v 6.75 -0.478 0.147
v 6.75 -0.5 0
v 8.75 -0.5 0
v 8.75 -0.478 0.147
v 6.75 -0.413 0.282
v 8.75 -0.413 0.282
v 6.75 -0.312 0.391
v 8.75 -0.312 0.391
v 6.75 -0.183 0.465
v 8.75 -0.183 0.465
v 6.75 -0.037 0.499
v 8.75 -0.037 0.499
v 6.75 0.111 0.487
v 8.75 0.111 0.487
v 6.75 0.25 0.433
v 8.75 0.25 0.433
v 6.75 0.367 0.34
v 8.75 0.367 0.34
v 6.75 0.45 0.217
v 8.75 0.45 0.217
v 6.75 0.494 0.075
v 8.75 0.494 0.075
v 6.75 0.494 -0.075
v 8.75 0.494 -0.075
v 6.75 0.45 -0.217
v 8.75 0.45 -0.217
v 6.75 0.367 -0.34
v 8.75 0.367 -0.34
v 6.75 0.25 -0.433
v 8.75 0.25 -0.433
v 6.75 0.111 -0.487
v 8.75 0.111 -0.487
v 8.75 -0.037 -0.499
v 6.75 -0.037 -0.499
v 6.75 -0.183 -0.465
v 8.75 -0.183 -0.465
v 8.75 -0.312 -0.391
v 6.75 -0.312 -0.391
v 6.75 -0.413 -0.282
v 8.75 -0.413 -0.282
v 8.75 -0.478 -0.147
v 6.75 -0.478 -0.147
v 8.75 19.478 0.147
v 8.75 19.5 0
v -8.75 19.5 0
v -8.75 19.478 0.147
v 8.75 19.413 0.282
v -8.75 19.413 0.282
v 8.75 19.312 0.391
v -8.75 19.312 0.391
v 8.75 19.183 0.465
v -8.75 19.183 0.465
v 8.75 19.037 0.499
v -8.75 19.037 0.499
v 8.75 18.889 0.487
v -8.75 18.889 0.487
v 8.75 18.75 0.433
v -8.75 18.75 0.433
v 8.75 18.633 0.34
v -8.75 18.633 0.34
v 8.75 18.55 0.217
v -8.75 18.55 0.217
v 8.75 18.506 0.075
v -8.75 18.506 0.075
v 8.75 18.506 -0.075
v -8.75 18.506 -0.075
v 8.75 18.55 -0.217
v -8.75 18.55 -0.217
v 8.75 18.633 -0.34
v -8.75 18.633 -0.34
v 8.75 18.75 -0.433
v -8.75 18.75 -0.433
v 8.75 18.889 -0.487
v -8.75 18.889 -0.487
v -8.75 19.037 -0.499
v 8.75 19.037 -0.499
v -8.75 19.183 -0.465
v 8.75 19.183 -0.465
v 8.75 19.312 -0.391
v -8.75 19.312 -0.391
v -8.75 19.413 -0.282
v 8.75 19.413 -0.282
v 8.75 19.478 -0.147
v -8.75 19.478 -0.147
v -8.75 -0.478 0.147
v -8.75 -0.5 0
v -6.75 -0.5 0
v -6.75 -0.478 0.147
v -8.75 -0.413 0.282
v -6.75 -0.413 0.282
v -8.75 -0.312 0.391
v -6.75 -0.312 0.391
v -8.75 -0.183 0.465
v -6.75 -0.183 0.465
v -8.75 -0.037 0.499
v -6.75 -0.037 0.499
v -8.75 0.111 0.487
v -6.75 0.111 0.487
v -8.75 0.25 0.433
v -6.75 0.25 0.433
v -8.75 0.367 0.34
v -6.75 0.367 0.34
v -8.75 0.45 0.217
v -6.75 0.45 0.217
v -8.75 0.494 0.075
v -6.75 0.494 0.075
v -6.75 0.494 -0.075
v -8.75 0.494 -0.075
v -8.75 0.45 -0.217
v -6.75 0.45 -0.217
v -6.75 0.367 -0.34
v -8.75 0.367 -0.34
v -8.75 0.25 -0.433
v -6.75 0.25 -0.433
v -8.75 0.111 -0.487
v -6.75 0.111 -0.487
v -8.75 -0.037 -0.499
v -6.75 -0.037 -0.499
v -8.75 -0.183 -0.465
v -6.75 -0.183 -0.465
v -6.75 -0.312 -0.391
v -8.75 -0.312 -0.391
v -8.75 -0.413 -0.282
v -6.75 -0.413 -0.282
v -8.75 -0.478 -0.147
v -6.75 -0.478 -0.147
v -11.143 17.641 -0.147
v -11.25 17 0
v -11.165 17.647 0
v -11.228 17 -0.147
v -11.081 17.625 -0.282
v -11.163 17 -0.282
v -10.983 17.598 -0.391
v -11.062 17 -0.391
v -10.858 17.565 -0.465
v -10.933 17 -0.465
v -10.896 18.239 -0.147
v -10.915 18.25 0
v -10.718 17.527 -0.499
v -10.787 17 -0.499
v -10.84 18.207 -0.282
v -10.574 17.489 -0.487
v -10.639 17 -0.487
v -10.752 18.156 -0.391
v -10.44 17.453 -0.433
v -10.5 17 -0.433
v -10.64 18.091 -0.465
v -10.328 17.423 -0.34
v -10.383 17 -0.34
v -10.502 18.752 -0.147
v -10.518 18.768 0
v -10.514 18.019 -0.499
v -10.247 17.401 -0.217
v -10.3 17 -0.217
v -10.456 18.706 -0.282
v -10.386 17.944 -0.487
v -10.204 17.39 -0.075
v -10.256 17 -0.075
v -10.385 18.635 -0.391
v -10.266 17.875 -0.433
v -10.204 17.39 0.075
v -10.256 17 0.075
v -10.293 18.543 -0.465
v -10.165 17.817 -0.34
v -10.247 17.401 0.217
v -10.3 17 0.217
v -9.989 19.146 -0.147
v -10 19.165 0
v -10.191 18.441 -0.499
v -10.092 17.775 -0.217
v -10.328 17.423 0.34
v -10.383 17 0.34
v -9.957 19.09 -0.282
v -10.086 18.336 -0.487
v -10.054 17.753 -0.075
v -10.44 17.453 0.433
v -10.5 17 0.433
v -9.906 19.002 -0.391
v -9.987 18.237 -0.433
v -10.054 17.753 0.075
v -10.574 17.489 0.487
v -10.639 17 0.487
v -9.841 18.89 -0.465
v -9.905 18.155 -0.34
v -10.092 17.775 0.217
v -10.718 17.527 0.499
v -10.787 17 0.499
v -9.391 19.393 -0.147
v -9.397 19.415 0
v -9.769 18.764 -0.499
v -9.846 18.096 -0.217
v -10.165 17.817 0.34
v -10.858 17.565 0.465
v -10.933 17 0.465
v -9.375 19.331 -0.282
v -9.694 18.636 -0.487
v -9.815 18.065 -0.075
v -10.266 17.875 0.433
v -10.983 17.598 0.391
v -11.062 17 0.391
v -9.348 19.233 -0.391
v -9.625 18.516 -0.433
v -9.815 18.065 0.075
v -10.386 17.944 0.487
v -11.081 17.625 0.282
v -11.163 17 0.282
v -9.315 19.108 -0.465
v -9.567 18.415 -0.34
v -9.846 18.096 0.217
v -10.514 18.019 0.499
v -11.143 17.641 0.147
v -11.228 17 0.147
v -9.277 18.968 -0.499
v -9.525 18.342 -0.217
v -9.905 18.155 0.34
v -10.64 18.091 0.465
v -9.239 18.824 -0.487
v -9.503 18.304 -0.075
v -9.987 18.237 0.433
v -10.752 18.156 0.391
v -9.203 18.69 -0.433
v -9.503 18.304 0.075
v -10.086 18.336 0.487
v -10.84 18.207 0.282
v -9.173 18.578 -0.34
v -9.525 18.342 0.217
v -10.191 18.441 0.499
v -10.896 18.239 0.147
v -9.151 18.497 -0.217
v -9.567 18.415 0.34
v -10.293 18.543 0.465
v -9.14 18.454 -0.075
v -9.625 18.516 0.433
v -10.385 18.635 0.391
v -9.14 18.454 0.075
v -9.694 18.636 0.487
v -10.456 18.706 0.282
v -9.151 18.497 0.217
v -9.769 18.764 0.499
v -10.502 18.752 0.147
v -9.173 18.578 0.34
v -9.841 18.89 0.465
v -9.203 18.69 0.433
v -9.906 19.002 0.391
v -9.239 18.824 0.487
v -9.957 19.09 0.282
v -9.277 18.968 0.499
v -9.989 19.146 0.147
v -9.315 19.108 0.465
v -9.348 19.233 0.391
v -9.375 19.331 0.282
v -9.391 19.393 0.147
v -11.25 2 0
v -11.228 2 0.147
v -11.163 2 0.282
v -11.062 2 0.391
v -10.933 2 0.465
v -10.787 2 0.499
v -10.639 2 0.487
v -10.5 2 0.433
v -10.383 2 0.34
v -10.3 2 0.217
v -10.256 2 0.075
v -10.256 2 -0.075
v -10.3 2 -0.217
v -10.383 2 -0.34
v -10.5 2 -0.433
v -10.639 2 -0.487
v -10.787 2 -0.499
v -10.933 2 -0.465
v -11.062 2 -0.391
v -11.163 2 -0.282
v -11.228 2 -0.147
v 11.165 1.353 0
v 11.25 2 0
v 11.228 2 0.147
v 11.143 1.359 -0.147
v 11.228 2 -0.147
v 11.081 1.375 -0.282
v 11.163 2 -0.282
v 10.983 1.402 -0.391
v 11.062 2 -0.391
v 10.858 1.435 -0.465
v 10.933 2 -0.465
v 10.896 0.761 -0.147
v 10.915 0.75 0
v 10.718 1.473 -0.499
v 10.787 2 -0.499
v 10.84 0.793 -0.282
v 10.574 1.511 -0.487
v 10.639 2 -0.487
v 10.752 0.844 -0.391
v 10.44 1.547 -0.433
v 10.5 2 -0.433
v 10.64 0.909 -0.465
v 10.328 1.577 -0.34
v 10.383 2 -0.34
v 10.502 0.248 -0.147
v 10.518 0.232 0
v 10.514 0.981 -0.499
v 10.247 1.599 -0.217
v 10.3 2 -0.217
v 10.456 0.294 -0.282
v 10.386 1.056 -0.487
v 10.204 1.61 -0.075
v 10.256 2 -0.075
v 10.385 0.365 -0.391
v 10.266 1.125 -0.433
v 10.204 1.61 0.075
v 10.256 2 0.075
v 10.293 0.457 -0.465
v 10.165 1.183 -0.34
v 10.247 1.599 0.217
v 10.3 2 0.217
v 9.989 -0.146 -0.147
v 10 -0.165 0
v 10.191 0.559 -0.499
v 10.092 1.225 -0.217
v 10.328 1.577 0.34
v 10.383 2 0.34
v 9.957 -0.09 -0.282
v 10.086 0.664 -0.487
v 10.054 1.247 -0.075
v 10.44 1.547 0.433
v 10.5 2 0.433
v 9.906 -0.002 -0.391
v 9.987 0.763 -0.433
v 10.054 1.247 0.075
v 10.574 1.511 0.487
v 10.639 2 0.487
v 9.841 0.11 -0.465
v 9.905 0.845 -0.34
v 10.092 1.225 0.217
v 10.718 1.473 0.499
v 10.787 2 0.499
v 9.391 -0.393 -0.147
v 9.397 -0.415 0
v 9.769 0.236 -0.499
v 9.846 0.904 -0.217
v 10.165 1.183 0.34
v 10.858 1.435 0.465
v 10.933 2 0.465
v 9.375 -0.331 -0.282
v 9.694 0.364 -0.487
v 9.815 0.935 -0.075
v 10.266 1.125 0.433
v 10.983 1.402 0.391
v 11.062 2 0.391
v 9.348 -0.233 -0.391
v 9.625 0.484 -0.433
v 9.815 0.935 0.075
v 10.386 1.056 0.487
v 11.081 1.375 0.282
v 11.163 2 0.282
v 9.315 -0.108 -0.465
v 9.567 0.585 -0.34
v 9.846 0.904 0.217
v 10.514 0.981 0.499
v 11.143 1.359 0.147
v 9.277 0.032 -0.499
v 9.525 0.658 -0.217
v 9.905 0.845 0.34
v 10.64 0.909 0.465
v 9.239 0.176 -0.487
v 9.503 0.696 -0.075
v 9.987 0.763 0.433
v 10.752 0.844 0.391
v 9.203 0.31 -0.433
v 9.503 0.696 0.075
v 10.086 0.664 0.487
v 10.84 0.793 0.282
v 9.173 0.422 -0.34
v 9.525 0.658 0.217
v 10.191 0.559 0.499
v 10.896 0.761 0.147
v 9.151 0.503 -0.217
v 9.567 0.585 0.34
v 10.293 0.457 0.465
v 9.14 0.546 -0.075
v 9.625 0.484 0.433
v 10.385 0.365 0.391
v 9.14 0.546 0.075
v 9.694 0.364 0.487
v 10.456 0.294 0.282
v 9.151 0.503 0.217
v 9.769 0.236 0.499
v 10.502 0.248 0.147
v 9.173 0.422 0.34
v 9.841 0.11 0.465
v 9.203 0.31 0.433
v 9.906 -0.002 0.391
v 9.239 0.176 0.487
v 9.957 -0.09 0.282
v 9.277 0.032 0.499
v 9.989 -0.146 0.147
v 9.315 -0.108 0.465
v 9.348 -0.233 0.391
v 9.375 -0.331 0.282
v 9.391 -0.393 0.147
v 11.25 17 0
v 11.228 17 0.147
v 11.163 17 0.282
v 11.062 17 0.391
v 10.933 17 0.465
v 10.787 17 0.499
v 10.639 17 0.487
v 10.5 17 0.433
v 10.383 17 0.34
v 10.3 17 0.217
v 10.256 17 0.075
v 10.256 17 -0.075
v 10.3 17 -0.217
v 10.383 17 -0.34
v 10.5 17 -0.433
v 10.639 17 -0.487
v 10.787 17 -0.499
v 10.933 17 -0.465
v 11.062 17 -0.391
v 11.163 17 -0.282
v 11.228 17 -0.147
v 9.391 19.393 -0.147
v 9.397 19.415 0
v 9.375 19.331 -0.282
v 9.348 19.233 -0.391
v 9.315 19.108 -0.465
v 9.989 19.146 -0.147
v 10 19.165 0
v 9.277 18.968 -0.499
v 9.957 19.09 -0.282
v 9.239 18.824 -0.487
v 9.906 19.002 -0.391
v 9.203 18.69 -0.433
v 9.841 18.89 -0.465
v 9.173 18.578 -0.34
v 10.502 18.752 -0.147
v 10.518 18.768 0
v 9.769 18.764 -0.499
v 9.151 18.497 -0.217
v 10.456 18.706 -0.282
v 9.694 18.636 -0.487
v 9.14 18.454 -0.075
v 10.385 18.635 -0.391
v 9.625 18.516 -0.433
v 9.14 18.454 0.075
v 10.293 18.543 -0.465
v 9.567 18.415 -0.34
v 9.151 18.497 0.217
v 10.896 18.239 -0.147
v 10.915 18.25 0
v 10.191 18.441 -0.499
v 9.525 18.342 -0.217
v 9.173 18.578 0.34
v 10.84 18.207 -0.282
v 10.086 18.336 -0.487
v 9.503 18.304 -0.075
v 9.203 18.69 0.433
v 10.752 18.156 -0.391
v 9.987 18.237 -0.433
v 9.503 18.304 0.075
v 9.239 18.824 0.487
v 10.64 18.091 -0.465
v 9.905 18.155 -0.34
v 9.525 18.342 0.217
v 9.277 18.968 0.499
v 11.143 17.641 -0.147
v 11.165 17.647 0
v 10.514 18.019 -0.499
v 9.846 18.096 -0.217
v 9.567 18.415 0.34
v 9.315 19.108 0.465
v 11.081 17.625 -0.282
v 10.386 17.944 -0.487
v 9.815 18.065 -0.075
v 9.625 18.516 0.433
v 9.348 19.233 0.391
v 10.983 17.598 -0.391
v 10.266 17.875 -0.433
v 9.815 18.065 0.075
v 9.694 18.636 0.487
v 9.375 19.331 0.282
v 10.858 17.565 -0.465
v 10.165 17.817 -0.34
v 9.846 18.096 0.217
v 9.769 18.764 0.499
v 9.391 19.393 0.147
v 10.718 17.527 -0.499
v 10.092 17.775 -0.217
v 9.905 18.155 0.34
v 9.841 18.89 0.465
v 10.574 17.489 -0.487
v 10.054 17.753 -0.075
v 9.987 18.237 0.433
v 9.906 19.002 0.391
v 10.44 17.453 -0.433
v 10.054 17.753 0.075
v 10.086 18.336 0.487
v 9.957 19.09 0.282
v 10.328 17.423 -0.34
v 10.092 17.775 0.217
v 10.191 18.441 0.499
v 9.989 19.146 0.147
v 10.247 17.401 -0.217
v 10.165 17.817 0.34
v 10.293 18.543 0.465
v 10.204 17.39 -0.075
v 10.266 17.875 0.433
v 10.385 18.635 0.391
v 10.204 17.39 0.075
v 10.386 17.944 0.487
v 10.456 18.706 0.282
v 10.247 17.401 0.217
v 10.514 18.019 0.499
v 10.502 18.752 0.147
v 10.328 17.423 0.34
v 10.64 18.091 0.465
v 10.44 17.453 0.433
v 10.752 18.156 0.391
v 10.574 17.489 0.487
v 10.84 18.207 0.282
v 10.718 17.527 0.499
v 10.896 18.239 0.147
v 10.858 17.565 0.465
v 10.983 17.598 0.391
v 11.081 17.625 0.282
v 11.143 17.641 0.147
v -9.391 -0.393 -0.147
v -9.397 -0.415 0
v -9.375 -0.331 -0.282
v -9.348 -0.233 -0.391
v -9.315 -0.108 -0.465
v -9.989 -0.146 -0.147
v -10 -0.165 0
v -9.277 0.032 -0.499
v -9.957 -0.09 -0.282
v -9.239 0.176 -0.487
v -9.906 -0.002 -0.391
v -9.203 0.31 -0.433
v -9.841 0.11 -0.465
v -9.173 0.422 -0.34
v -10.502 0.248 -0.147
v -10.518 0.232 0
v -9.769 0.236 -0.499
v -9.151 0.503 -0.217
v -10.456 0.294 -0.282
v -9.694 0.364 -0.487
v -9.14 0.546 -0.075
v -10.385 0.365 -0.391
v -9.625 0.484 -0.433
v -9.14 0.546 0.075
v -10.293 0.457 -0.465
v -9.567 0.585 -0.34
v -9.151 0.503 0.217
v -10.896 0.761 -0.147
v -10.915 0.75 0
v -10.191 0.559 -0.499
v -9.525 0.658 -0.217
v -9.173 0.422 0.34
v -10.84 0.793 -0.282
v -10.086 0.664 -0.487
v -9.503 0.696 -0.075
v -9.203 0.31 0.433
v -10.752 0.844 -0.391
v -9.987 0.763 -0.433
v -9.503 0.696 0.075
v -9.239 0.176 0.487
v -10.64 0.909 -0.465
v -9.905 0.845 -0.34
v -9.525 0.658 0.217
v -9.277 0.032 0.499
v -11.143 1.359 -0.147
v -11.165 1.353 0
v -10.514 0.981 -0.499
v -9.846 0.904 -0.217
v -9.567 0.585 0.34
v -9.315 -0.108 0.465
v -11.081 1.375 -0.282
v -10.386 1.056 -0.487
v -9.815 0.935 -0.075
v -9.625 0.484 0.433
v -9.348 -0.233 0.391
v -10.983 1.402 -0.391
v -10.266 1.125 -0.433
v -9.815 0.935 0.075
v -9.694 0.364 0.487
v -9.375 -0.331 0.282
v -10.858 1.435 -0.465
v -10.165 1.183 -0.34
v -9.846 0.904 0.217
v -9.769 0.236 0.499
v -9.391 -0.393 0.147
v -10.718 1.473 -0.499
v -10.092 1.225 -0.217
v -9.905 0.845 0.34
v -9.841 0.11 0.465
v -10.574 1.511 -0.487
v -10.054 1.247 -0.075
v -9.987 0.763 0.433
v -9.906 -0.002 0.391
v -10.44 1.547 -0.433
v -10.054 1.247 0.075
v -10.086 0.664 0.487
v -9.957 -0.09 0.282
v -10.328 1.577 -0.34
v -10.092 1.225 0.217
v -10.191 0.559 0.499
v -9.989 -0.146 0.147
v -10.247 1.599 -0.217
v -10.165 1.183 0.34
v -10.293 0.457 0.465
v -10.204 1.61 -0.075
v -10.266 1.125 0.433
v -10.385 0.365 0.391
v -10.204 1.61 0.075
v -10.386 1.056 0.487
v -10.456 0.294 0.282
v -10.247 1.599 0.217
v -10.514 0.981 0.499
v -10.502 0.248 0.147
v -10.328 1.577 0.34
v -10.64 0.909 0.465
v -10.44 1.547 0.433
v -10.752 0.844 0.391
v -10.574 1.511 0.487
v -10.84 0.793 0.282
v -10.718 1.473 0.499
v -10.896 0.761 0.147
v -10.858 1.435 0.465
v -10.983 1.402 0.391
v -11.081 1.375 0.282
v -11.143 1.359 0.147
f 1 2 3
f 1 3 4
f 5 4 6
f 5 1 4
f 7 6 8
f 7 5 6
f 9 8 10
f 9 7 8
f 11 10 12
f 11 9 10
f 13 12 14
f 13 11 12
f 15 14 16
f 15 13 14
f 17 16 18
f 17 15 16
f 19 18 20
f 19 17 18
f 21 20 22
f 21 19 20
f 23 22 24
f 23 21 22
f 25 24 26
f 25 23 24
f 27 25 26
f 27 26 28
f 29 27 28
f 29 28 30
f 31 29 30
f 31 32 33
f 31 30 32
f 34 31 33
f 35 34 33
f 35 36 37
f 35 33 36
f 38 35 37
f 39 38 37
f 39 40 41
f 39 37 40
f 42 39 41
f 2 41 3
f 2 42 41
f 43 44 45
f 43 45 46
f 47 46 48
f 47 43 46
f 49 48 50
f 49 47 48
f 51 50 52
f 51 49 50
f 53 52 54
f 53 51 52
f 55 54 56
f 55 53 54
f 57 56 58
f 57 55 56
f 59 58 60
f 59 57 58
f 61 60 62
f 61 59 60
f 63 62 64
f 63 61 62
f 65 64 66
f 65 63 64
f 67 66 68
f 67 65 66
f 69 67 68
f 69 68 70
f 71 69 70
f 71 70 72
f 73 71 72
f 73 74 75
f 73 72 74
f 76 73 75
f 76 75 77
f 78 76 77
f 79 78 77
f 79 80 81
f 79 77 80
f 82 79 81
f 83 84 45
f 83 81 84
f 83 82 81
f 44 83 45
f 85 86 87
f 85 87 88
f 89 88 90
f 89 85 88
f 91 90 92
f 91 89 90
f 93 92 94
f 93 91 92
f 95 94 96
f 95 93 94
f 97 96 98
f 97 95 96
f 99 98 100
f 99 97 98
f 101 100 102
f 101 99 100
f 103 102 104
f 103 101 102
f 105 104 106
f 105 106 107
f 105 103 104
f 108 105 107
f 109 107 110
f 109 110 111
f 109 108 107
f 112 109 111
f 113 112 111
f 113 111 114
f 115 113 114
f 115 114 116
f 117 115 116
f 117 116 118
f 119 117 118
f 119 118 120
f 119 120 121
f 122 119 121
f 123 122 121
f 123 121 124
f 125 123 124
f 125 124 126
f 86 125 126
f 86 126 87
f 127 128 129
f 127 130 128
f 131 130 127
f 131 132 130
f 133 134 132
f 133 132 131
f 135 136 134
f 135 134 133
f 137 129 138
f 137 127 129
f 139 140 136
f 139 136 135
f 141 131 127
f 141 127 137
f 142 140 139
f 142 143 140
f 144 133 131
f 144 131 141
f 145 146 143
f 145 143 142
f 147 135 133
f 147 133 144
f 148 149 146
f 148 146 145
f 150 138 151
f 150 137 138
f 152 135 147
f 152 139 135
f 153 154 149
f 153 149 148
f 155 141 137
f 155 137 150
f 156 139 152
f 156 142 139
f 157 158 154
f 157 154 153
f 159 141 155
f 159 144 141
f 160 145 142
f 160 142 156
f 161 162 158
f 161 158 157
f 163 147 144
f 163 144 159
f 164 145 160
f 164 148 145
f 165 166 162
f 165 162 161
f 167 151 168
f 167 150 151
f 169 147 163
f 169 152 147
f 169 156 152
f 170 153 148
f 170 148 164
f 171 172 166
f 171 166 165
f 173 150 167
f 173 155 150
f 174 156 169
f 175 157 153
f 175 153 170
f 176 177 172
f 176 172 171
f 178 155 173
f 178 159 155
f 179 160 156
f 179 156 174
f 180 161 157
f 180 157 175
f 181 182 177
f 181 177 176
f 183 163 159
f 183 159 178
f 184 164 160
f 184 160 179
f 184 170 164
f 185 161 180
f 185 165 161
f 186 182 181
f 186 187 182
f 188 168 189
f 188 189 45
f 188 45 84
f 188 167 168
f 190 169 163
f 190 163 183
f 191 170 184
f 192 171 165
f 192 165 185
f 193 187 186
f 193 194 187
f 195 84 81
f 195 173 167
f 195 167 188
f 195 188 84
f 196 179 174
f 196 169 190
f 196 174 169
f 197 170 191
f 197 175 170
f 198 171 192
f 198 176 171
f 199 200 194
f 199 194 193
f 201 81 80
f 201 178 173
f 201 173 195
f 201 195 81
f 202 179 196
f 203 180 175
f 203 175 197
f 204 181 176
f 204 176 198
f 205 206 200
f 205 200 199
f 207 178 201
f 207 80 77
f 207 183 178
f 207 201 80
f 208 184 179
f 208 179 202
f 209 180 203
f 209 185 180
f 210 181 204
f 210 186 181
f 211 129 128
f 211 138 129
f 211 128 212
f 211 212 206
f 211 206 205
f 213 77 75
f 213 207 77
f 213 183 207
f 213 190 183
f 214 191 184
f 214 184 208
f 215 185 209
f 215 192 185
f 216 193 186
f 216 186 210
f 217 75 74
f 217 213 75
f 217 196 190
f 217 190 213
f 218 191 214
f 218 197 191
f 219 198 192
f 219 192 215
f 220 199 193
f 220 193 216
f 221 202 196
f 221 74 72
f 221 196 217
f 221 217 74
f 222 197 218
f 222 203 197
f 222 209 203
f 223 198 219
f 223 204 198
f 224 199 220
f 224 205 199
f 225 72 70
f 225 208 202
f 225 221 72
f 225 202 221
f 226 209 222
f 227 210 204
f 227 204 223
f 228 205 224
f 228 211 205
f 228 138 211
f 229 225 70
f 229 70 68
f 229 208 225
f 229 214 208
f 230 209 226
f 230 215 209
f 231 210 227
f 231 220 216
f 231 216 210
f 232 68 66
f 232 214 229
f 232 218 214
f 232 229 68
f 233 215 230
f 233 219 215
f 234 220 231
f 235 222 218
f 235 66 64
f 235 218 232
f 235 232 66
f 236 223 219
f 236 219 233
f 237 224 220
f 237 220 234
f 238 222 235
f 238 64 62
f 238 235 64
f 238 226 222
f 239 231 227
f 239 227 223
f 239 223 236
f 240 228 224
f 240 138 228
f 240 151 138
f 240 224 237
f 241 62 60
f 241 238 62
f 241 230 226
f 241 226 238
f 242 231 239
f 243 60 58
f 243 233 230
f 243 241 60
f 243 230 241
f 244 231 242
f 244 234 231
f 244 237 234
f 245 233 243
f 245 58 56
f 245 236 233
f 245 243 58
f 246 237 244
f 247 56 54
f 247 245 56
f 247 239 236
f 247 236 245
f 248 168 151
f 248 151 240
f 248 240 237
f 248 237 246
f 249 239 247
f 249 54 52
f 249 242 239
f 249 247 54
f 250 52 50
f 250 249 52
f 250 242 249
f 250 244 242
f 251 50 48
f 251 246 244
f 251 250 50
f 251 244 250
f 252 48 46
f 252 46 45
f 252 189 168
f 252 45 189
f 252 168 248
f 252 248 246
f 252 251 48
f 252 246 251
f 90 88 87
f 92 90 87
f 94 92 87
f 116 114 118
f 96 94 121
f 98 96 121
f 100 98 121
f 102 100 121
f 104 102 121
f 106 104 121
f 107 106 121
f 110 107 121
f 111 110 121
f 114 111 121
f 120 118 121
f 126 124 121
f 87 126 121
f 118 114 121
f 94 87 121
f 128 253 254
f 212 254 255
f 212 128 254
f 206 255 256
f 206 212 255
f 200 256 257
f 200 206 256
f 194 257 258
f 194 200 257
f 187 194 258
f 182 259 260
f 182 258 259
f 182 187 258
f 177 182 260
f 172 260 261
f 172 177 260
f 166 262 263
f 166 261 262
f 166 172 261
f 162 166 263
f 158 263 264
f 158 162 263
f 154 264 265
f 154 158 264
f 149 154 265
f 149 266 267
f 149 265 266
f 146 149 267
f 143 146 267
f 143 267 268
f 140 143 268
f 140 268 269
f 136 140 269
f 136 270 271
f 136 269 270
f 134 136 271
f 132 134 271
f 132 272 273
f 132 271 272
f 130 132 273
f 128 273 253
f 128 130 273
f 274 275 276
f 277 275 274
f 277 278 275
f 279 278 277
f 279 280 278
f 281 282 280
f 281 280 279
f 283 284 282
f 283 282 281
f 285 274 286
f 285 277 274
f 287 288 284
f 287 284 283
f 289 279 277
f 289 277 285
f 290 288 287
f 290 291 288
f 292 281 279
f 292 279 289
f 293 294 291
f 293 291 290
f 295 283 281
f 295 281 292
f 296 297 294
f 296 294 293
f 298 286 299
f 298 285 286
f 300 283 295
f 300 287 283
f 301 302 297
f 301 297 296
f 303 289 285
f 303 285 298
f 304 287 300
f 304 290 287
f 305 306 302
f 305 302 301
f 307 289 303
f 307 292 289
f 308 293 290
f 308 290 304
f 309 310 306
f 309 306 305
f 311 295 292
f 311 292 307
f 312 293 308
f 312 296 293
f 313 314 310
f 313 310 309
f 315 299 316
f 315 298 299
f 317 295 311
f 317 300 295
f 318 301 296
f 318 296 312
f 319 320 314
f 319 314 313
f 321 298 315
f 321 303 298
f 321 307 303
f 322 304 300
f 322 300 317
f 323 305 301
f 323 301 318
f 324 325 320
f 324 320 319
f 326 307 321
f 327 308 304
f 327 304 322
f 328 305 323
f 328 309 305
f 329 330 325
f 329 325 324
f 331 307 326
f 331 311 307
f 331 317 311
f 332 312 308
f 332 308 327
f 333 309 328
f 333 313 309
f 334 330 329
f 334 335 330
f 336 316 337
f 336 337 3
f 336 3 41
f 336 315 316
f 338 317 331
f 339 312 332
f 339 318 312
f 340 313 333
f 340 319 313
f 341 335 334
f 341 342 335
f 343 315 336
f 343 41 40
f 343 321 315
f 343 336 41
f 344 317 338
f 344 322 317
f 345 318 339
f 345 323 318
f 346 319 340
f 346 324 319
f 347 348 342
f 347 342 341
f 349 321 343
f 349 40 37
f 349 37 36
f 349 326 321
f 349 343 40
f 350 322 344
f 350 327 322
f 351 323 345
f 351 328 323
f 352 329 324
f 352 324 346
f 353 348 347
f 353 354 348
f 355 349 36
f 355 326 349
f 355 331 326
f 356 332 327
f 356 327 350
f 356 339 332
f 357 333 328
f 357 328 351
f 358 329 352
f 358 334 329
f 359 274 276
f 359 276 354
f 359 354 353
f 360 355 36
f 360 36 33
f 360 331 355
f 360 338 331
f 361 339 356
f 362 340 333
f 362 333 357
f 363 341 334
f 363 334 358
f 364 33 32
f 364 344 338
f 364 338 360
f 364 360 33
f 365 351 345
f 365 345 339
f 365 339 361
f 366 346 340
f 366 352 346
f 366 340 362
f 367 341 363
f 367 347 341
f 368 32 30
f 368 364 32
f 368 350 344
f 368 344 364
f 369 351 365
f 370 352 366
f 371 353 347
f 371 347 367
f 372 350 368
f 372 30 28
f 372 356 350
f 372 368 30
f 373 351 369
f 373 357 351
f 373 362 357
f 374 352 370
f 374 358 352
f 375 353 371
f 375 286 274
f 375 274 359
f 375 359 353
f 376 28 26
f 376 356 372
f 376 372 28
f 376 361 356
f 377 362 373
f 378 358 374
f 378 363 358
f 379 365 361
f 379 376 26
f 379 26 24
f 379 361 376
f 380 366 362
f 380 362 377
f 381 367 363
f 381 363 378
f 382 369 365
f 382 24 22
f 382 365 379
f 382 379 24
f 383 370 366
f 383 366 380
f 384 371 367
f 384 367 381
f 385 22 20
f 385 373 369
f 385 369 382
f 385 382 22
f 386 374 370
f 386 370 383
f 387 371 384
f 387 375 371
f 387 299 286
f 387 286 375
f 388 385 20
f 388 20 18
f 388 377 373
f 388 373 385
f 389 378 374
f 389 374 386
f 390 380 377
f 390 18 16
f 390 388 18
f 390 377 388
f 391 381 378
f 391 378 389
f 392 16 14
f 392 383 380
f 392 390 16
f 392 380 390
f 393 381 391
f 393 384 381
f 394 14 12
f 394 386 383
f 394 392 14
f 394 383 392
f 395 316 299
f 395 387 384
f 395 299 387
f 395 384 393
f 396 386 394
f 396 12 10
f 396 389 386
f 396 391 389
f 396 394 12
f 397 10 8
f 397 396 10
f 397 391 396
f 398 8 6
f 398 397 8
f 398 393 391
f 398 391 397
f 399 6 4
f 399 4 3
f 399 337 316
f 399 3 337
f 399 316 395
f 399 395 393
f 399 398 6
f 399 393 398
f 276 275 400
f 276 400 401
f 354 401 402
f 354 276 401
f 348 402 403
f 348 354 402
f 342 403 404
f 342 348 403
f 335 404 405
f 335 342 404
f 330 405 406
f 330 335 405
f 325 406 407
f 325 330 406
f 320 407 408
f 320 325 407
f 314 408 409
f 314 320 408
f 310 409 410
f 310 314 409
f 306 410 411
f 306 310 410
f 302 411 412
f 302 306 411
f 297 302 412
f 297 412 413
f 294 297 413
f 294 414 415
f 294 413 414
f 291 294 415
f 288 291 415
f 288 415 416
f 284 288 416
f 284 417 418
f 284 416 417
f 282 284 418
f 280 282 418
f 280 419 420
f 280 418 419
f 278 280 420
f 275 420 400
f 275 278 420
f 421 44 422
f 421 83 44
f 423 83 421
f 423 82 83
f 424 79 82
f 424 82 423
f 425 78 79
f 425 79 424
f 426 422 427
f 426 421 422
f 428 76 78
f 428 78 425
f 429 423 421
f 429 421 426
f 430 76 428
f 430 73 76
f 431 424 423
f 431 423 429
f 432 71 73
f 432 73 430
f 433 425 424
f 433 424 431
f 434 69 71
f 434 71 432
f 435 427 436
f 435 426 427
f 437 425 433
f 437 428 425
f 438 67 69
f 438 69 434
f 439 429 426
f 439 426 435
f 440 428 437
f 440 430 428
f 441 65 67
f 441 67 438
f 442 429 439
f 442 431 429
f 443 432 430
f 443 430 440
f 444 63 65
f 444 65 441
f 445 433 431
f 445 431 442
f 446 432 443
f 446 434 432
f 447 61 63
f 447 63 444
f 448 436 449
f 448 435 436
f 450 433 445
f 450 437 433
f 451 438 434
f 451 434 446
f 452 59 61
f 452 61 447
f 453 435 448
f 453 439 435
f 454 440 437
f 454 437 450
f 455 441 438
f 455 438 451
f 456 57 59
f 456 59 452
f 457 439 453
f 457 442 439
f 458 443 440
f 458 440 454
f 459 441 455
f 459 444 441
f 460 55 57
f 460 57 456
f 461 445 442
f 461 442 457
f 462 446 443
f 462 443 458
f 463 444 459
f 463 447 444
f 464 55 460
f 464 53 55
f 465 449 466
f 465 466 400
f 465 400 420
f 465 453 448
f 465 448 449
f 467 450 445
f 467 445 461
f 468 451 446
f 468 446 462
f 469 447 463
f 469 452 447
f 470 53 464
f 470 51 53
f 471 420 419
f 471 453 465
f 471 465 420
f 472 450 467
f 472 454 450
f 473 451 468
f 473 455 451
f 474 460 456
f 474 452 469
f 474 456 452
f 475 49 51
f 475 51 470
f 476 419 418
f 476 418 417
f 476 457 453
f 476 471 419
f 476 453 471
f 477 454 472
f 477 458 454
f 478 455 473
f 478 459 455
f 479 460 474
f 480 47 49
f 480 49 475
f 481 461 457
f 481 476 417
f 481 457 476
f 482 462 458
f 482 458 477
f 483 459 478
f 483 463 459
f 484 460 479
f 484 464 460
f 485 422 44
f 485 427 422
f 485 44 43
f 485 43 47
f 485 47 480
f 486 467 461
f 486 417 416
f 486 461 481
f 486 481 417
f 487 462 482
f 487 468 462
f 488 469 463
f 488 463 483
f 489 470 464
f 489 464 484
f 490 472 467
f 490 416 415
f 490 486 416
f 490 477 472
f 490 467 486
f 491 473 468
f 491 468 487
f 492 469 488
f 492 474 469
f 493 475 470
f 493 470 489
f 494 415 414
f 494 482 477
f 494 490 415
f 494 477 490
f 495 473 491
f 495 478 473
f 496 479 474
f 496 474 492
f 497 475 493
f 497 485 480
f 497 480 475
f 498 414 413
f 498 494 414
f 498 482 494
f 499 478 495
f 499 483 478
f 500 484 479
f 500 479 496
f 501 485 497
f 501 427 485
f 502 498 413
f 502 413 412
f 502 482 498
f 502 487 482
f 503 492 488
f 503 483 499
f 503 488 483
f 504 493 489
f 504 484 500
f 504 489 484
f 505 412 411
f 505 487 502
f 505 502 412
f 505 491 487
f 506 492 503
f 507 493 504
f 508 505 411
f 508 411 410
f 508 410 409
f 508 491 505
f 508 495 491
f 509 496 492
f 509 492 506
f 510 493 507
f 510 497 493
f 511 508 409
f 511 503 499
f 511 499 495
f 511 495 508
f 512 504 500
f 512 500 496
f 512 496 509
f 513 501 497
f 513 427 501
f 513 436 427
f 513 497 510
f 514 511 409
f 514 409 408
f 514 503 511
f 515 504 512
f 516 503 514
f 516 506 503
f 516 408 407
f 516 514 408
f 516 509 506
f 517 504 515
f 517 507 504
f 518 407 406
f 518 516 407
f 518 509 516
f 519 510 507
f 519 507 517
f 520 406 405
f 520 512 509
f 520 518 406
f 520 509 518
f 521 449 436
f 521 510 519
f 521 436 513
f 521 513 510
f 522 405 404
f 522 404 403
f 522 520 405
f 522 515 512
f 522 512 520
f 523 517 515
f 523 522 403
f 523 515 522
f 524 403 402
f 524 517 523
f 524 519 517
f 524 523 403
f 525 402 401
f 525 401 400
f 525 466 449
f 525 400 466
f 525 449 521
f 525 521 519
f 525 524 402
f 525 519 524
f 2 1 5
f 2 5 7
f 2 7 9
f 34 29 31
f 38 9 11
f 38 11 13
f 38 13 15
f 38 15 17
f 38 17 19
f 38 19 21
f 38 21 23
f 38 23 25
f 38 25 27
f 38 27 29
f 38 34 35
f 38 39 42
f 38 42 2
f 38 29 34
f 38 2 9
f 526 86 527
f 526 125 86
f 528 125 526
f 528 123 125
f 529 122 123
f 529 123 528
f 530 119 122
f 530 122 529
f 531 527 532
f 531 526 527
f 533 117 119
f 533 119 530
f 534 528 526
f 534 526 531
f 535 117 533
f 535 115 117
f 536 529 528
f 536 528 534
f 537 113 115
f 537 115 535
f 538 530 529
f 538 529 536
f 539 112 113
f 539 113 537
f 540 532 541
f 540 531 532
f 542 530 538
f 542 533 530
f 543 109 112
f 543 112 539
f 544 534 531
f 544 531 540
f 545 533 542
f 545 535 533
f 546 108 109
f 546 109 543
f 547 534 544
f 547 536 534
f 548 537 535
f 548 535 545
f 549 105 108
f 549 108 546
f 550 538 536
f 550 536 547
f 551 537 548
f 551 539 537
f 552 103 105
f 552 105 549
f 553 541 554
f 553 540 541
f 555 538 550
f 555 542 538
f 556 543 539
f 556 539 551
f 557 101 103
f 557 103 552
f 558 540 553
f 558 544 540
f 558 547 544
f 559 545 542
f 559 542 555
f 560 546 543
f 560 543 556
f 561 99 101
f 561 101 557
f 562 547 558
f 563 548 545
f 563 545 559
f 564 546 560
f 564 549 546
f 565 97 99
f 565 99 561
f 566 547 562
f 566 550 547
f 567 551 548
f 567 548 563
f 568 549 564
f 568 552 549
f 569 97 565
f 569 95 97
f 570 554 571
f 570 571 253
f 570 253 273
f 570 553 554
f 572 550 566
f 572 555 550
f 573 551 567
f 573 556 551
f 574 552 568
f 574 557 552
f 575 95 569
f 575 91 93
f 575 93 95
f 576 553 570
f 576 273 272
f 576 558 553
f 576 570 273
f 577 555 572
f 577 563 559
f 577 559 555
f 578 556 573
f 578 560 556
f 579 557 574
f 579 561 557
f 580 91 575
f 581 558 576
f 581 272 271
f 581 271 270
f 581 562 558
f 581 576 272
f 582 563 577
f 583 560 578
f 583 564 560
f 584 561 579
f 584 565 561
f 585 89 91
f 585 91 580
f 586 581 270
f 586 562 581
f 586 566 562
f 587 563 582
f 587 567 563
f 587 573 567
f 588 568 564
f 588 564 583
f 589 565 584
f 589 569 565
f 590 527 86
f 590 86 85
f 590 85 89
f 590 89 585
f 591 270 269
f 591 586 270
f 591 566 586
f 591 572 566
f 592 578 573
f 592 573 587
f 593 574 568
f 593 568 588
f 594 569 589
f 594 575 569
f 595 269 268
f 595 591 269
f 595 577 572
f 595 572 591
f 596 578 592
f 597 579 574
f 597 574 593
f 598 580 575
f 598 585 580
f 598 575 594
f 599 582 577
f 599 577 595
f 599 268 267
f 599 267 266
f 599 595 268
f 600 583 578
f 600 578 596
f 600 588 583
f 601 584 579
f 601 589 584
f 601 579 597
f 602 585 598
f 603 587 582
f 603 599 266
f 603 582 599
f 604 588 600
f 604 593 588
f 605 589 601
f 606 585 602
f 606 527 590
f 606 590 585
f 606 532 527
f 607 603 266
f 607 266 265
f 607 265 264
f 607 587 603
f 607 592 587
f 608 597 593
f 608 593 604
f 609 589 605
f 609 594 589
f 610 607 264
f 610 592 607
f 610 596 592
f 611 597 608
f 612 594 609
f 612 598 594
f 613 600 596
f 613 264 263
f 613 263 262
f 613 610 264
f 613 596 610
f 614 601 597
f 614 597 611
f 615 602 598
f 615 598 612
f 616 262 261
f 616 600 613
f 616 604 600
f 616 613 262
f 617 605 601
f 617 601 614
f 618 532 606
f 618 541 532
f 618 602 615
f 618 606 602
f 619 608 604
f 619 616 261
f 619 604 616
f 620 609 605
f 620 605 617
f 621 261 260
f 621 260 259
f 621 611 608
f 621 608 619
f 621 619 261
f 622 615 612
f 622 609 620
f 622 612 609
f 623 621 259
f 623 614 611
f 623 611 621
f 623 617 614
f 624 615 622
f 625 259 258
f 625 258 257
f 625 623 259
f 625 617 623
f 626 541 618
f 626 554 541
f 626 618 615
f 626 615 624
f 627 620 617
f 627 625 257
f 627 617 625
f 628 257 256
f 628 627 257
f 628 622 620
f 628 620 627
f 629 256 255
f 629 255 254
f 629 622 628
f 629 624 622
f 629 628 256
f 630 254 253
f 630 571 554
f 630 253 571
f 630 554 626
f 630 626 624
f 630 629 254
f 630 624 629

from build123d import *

# Parameters (mm, degrees)
SWEEP_1_PROFILE_R = 0.5


with BuildPart() as part:
    # 扫描1: sweep along a path in 草图1
    with BuildLine(Plane.XY) as sweep_1_path:
        Line((-6.75, 0), (-8.75, 0))
        ThreePointArc((-8.75, 0), (-10.164213562, 0.585786438), (-10.75, 2))
        Line((-10.75, 2), (-10.75, 17))
        ThreePointArc((-10.75, 17), (-10.164213562, 18.414213562), (-8.75, 19))
        Line((-8.75, 19), (8.75, 19))
        ThreePointArc((8.75, 19), (10.164213562, 18.414213562), (10.75, 17))
        Line((10.75, 17), (10.75, 2))
        ThreePointArc((10.75, 2), (10.164213562, 0.585786438), (8.75, 0))
        Line((8.75, 0), (6.75, 0))
    # 扫描1 profile (on start of the path) → 扫描1 (sweep)
    with BuildSketch(Plane(origin=(-6.75, 0, 0), x_dir=(0, -1, 0), z_dir=(-1, 0, 0))):
        Circle(SWEEP_1_PROFILE_R)
    sweep(path=sweep_1_path.line)


solid = part.part
